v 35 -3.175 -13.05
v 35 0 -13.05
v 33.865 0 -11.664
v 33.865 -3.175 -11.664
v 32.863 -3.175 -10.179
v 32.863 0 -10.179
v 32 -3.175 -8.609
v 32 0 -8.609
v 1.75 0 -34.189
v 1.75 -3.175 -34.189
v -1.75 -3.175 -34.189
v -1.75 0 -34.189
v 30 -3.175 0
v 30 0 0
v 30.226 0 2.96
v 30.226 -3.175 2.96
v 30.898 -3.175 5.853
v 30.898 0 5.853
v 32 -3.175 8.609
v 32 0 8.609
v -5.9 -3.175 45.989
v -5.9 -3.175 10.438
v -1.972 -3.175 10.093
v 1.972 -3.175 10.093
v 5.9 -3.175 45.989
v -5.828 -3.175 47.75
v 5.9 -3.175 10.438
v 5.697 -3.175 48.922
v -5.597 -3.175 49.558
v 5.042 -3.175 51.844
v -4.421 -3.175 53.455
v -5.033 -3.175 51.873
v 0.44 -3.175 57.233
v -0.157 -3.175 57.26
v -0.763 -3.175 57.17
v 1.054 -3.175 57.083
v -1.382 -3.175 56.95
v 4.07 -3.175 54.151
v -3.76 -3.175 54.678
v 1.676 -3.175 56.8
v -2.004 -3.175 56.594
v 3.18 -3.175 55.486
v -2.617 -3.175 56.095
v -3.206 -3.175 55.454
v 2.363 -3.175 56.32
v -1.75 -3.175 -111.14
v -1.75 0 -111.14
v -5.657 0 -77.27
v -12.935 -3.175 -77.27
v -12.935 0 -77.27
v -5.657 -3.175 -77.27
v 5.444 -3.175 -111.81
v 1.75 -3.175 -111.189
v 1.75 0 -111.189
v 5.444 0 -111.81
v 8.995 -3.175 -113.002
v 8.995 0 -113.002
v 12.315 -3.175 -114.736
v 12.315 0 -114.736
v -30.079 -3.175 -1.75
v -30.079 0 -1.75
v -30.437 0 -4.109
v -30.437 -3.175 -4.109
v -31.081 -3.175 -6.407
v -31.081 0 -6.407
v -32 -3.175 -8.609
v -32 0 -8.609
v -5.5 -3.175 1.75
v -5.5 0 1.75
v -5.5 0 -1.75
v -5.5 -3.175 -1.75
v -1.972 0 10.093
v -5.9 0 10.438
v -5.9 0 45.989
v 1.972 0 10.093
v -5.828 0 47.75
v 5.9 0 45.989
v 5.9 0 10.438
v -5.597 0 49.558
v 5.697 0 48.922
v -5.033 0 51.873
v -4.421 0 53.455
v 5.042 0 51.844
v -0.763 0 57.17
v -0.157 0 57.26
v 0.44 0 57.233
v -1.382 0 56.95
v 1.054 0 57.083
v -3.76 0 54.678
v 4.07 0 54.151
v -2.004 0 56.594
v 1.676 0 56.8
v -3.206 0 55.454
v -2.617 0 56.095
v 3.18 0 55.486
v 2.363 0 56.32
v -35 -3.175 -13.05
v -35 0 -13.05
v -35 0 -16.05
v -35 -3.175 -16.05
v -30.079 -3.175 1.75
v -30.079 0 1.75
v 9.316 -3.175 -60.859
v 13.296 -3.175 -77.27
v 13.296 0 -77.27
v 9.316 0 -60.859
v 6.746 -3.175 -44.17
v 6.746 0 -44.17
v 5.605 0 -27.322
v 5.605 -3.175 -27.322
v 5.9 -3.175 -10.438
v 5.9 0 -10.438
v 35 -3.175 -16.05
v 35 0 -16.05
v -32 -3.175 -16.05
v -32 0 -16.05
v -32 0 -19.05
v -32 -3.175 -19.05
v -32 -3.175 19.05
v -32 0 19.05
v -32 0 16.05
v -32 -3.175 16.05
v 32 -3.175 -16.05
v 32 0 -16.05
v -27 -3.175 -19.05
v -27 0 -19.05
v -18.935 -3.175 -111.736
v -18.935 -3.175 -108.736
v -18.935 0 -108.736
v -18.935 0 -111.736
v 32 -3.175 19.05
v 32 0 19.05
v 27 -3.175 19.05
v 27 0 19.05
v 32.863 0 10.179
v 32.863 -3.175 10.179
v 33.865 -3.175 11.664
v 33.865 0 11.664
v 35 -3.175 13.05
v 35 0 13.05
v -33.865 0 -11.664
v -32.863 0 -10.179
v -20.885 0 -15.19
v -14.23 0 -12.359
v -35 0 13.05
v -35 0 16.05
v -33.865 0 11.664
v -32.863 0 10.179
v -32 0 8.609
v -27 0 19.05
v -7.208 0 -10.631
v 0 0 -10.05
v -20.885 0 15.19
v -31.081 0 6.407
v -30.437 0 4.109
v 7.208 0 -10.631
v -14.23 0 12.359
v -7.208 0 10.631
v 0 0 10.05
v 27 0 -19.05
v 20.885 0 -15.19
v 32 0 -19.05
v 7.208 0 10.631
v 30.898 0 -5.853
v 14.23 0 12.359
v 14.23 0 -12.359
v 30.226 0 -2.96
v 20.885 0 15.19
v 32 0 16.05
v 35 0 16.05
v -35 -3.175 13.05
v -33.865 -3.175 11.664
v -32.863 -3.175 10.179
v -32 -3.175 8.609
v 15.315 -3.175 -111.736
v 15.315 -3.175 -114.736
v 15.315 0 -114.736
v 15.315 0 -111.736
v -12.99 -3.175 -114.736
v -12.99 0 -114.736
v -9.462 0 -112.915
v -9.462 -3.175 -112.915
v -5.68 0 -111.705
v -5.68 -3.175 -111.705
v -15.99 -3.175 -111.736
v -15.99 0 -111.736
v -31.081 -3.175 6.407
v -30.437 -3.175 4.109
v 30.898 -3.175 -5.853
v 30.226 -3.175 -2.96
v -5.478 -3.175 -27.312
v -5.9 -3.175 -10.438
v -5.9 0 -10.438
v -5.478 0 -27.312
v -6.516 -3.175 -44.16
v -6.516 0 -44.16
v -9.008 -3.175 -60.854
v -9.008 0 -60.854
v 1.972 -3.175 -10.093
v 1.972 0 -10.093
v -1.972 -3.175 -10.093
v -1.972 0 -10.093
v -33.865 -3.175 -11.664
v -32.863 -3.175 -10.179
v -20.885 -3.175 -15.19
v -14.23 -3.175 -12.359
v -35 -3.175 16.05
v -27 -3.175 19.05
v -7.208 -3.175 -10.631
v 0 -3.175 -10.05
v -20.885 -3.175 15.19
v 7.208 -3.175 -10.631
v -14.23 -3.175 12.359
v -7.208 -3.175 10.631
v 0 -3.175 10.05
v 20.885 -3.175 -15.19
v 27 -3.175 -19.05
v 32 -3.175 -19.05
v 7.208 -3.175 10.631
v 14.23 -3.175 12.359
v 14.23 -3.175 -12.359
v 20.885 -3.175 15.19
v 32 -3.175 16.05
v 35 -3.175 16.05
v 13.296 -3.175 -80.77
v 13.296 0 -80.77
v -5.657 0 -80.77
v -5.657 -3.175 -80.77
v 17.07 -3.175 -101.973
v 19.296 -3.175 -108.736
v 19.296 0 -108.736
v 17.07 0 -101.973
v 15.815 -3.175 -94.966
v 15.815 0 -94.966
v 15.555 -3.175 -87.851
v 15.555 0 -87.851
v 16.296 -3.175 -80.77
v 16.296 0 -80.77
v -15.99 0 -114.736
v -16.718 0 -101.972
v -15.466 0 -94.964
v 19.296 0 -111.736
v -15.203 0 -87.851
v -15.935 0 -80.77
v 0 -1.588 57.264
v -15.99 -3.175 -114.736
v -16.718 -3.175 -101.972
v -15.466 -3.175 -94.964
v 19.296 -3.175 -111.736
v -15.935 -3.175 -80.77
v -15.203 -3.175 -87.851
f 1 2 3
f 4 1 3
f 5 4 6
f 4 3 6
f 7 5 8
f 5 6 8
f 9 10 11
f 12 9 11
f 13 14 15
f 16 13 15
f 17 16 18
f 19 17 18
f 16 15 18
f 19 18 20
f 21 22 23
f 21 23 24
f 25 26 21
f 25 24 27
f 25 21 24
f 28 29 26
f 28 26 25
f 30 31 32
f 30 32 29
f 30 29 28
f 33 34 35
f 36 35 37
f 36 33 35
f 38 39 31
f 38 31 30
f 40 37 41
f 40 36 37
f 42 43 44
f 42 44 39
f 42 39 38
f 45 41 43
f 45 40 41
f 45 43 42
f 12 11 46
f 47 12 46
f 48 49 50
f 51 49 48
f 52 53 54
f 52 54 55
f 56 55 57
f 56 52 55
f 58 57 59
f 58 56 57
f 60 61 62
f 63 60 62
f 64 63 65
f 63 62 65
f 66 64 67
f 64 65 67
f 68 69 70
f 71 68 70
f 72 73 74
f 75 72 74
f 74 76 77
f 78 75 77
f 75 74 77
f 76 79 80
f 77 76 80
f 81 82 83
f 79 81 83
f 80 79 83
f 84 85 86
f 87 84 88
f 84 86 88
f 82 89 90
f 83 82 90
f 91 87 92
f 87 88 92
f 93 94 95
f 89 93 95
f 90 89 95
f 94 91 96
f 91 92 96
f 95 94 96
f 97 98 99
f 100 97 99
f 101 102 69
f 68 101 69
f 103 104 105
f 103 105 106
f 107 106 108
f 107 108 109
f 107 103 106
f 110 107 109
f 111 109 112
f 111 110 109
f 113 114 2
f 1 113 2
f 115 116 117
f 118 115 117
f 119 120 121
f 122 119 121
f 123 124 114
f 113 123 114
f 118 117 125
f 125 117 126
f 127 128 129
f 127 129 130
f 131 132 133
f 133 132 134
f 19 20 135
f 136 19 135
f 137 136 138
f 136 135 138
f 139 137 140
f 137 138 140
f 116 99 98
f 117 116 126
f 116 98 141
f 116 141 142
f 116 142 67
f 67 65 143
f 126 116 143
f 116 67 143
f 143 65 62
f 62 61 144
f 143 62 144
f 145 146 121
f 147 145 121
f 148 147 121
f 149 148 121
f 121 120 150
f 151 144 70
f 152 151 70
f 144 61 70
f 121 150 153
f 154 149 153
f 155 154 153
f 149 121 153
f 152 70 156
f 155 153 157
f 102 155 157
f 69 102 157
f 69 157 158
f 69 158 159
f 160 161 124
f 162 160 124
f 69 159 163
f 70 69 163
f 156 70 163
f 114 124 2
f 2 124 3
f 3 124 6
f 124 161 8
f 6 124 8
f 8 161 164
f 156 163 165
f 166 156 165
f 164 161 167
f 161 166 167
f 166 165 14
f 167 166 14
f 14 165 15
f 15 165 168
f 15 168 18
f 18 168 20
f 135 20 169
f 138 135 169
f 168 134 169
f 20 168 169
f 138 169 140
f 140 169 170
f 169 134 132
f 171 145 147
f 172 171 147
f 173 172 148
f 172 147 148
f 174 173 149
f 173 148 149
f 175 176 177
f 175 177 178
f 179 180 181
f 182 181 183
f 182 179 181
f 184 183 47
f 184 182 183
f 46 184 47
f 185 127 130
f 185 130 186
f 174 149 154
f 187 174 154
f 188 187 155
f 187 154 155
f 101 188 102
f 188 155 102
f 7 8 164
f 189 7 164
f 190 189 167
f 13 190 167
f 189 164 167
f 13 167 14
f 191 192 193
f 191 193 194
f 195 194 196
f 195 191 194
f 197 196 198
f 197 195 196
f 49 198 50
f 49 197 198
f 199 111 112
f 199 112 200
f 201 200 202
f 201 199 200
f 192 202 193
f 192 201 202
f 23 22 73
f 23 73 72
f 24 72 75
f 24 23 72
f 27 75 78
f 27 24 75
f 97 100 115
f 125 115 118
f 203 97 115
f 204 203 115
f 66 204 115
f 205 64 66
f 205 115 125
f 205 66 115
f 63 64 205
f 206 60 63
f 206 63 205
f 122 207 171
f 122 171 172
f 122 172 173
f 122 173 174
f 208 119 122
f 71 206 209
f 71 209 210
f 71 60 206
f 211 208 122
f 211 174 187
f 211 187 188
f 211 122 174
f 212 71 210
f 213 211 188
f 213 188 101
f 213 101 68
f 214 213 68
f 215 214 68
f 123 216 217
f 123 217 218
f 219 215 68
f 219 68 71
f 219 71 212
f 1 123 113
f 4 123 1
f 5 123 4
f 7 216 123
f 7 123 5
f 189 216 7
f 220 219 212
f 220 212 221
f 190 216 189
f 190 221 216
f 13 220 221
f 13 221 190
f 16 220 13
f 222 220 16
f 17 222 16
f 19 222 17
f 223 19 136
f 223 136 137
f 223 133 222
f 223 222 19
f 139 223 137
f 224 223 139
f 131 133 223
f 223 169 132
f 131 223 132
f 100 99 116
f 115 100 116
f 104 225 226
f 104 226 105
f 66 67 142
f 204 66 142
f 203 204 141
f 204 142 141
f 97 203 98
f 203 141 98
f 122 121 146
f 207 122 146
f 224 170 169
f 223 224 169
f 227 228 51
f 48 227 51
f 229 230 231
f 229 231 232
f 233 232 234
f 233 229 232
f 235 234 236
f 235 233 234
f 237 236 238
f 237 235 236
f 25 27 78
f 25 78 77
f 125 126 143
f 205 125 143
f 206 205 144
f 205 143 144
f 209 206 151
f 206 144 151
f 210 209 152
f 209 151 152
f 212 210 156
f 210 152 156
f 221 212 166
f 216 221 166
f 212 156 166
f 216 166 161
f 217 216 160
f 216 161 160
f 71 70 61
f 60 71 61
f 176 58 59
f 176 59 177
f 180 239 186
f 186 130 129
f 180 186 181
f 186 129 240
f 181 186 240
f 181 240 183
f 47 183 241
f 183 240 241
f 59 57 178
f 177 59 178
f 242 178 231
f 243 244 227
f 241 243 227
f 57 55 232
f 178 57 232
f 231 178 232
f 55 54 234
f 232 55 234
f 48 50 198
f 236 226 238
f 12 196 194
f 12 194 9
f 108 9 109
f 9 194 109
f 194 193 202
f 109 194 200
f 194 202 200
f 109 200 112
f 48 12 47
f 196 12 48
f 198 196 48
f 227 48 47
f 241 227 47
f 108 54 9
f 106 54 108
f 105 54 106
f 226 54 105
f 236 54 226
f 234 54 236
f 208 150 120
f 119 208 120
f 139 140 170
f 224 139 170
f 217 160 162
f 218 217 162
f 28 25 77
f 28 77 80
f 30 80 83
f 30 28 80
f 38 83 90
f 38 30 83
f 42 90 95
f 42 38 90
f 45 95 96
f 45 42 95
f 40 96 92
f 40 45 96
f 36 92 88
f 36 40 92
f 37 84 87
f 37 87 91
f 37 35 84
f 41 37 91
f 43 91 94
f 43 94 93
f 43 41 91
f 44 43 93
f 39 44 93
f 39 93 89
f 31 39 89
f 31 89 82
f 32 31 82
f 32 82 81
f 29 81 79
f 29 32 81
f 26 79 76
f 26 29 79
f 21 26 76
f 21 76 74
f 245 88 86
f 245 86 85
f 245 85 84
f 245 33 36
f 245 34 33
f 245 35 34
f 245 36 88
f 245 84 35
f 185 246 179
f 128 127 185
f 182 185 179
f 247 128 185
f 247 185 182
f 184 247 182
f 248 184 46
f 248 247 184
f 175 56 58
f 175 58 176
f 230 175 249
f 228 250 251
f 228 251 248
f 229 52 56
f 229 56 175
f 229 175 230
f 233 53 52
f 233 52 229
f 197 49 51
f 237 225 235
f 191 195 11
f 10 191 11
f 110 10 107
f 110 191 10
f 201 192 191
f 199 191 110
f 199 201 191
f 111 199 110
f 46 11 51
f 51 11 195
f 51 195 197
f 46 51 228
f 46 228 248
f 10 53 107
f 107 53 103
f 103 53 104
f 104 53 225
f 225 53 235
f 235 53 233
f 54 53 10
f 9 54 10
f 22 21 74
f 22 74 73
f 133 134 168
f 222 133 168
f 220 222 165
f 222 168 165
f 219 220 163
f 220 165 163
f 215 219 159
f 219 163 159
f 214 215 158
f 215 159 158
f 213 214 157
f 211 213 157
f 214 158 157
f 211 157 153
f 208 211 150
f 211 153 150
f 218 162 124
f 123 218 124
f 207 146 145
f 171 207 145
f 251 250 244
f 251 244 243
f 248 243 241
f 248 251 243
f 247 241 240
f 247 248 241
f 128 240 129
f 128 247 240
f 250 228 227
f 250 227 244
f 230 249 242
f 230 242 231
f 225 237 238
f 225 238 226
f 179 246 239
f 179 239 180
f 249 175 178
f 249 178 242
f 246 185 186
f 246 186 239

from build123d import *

# Parameters (mm, degrees)
F1_DEPTH = 3.175
F3_DEPTH = 3.175
F4_W     = 7.2773662827
F4_H     = 3.5
F5_DEPTH = 3.1760001


# Not quite as in the source:
# - a length typed as a fraction of an inch, garbled in the dataset ("3 / 203.2 mm" for 3/8 in), is restored


with BuildPart() as f1:
    # F0 (on Front) → F1 (new body)
    with BuildSketch(Plane.XZ):
        with BuildLine():
            Line((32, -16.05), (35, -16.05))
            Line((35, -16.05), (35, -13.05))
            ThreePointArc((35, -13.05), (33.3469639854, -10.9330653905), (32, -8.6093553766))
            Line((32, -8.6093553766), (32, -16.05))
        make_face()
        with BuildLine():
            ThreePointArc((32, 8.6093553766), (33.3469639854, 10.9330653905), (35, 13.05))
            Line((35, 13.05), (35, 16.05))
            Line((35, 16.05), (32, 16.05))
            Line((32, 16.05), (32, 8.6093553766))
        make_face()
        with BuildLine():
            Line((-35, -16.05), (-32, -16.05))
            Line((-32, -16.05), (-32, -8.6093553766))
            ThreePointArc((-32, -8.6093553766), (-33.3469639854, -10.9330653905), (-35, -13.05))
            Line((-35, -13.05), (-35, -16.05))
        make_face()
        with BuildLine():
            ThreePointArc((-35, 13.05), (-33.3469639854, 10.9330653905), (-32, 8.6093553766))
            Line((-32, 8.6093553766), (-32, 16.05))
            Line((-32, 16.05), (-35, 16.05))
            Line((-35, 16.05), (-35, 13.05))
        make_face()
        with BuildLine():
            Line((27, -19.05), (32, -19.05))
            Line((32, -19.05), (32, -16.05))
            Line((32, -16.05), (32, -8.6093553766))
            ThreePointArc((32, -8.6093553766), (30.5065696236, -4.4193042439), (30, 0))
            Line((30, 0), (-5.5, 0))
            Line((-5.5, 0), (-5.5, -1.75))
            Line((-5.5, -1.75), (-30.0785620254, -1.75))
            ThreePointArc((-30.0785620254, -1.75), (-30.7239047108, -5.268020684), (-32, -8.6093553766))
            Line((-32, -8.6093553766), (-32, -16.05))
            Line((-32, -16.05), (-32, -19.05))
            Line((-32, -19.05), (-27, -19.05))
            ThreePointArc((-27, -19.05), (0, -10.05), (27, -19.05))
        make_face()
        with BuildLine():
            ThreePointArc((30, 0), (30.5065696236, 4.4193042439), (32, 8.6093553766))
            Line((32, 8.6093553766), (32, 16.05))
            Line((32, 16.05), (32, 19.05))
            Line((32, 19.05), (27, 19.05))
            ThreePointArc((27, 19.05), (0, 10.05), (-27, 19.05))
            Line((-27, 19.05), (-32, 19.05))
            Line((-32, 19.05), (-32, 16.05))
            Line((-32, 16.05), (-32, 8.6093553766))
            ThreePointArc((-32, 8.6093553766), (-30.7239047108, 5.268020684), (-30.0785620254, 1.75))
            Line((-30.0785620254, 1.75), (-5.5, 1.75))
            Line((-5.5, 1.75), (-5.5, 0))
            Line((-5.5, 0), (30, 0))
        make_face()
    extrude(amount=F1_DEPTH)


with BuildPart() as f3:
    # F2 (on face) → F3 (new body)
    with BuildSketch(Plane.XZ.offset(3.175)):
        with BuildLine():
            add(Edge.make_bspline(
                [(5.9, 45.9891505916), (5.9, 57.2641204958), (0, 57.2641204958), (-5.9, 57.2641204958), (-5.9, 45.9891505916)],
                knots=[1.5707963268, 1.5707963268, 1.5707963268, 3.1415926536, 3.1415926536, 4.7123889804, 4.7123889804, 4.7123889804], degree=2, weights=[1, 0.7071067812, 1, 0.7071067812, 1]))
            Line((-5.9, 45.9891505916), (5.9, 45.9891505916))
        make_face()
        with BuildLine():
            Line((-5.9, 45.9891505916), (-5.9, 10.4384544092))
            Line((-5.9, 10.4384544092), (5.9, 10.4384544092))
            Line((5.9, 10.4384544092), (5.9, 45.9891505916))
            add(Edge.make_bspline(
                [(0, 34.7141806875), (5.9, 34.7141806875), (5.9, 45.9891505916)],
                knots=[0, 0, 0, 1.5707963268, 1.5707963268, 1.5707963268], degree=2, weights=[1, 0.7071067812, 1]))
            add(Edge.make_bspline(
                [(-5.9, 45.9891505916), (-5.9, 34.7141806875), (0, 34.7141806875)],
                knots=[4.7123889804, 4.7123889804, 4.7123889804, 6.2831853072, 6.2831853072, 6.2831853072], degree=2, weights=[1, 0.7071067812, 1]))
        make_face()
        with BuildLine():
            Line((5.9, 45.9891505916), (-5.9, 45.9891505916))
            add(Edge.make_bspline(
                [(-5.9, 45.9891505916), (-5.9, 34.7141806875), (0, 34.7141806875)],
                knots=[4.7123889804, 4.7123889804, 4.7123889804, 6.2831853072, 6.2831853072, 6.2831853072], degree=2, weights=[1, 0.7071067812, 1]))
            add(Edge.make_bspline(
                [(0, 34.7141806875), (5.9, 34.7141806875), (5.9, 45.9891505916)],
                knots=[0, 0, 0, 1.5707963268, 1.5707963268, 1.5707963268], degree=2, weights=[1, 0.7071067812, 1]))
        make_face()
        with BuildLine():
            ThreePointArc((13.2956086248, -77.2701255913), (6.7462265041, -44.1698462786), (5.9, -10.4384544092))
            Line((5.9, -10.4384544092), (-5.9, -10.4384544092))
            ThreePointArc((-5.9, -10.4384544092), (-6.5162024945, -44.1596635216), (-12.9346875995, -77.2701255913))
            Line((-12.9346875995, -77.2701255913), (13.2956086248, -77.2701255913))
        make_face()
        with BuildLine():
            Line((13.2956086248, -80.7701255913), (13.2956086248, -77.2701255913))
            Line((13.2956086248, -77.2701255913), (-12.9346875995, -77.2701255913))
            Line((-12.9346875995, -77.2701255913), (-12.9346875995, -80.7701255913))
            Line((-12.9346875995, -80.7701255913), (-15.9346875995, -80.7701255913))
            ThreePointArc((-15.9346875995, -80.7701255913), (-15.4658906298, -94.9642033946), (-18.9346875995, -108.7358795042))
            Line((-18.9346875995, -108.7358795042), (-18.9346875995, -111.7358795042))
            Line((-18.9346875995, -111.7358795042), (-15.9900602624, -111.7358795042))
            Line((-15.9900602624, -111.7358795042), (-15.9900602624, -114.7358795042))
            Line((-15.9900602624, -114.7358795042), (-12.9900602624, -114.7358795042))
            ThreePointArc((-12.9900602624, -114.7358795042), (-0.3376854584, -111.0977054943), (12.3146893457, -114.7358795042))
            Line((12.3146893457, -114.7358795042), (15.3146893457, -114.7358795042))
            Line((15.3146893457, -114.7358795042), (15.3146893457, -111.7358795042))
            Line((15.3146893457, -111.7358795042), (19.2956086248, -111.7358795042))
            Line((19.2956086248, -111.7358795042), (19.2956086248, -108.7358795042))
            ThreePointArc((19.2956086248, -108.7358795042), (15.814653799, -94.9655076172), (16.2956086248, -80.7701255913))
            Line((16.2956086248, -80.7701255913), (13.2956086248, -80.7701255913))
        make_face()
        with BuildLine():
            Line((5.9, 10.4384544092), (-5.9, 10.4384544092))
            ThreePointArc((-5.9, 10.4384544092), (0, 10.05), (5.9, 10.4384544092))
        make_face()
        with BuildLine():
            Line((-5.9, -10.4384544092), (5.9, -10.4384544092))
            ThreePointArc((5.9, -10.4384544092), (0, -10.05), (-5.9, -10.4384544092))
        make_face()
    extrude(amount=-F3_DEPTH)

    # F4 (on face) → F5 (cut, through all)
    with BuildSketch(Plane.XZ.offset(3.175)):
        with BuildLine():
            Line((-1.75, -34.1893706199), (-1.75, -111.1396121123))
            ThreePointArc((-1.75, -111.1396121123), (0.0009152594, -111.1001122679), (1.75, -111.1893706199))
            Line((1.75, -111.1893706199), (1.75, -34.1893706199))
            Line((1.75, -34.1893706199), (-1.75, -34.1893706199))
        make_face()
        with Locations((-9.2960044582, -79.0201255913)):
            Rectangle(F4_W, F4_H)
    extrude(amount=-F5_DEPTH, mode=Mode.SUBTRACT)


solid = Compound([f1.part, f3.part])
